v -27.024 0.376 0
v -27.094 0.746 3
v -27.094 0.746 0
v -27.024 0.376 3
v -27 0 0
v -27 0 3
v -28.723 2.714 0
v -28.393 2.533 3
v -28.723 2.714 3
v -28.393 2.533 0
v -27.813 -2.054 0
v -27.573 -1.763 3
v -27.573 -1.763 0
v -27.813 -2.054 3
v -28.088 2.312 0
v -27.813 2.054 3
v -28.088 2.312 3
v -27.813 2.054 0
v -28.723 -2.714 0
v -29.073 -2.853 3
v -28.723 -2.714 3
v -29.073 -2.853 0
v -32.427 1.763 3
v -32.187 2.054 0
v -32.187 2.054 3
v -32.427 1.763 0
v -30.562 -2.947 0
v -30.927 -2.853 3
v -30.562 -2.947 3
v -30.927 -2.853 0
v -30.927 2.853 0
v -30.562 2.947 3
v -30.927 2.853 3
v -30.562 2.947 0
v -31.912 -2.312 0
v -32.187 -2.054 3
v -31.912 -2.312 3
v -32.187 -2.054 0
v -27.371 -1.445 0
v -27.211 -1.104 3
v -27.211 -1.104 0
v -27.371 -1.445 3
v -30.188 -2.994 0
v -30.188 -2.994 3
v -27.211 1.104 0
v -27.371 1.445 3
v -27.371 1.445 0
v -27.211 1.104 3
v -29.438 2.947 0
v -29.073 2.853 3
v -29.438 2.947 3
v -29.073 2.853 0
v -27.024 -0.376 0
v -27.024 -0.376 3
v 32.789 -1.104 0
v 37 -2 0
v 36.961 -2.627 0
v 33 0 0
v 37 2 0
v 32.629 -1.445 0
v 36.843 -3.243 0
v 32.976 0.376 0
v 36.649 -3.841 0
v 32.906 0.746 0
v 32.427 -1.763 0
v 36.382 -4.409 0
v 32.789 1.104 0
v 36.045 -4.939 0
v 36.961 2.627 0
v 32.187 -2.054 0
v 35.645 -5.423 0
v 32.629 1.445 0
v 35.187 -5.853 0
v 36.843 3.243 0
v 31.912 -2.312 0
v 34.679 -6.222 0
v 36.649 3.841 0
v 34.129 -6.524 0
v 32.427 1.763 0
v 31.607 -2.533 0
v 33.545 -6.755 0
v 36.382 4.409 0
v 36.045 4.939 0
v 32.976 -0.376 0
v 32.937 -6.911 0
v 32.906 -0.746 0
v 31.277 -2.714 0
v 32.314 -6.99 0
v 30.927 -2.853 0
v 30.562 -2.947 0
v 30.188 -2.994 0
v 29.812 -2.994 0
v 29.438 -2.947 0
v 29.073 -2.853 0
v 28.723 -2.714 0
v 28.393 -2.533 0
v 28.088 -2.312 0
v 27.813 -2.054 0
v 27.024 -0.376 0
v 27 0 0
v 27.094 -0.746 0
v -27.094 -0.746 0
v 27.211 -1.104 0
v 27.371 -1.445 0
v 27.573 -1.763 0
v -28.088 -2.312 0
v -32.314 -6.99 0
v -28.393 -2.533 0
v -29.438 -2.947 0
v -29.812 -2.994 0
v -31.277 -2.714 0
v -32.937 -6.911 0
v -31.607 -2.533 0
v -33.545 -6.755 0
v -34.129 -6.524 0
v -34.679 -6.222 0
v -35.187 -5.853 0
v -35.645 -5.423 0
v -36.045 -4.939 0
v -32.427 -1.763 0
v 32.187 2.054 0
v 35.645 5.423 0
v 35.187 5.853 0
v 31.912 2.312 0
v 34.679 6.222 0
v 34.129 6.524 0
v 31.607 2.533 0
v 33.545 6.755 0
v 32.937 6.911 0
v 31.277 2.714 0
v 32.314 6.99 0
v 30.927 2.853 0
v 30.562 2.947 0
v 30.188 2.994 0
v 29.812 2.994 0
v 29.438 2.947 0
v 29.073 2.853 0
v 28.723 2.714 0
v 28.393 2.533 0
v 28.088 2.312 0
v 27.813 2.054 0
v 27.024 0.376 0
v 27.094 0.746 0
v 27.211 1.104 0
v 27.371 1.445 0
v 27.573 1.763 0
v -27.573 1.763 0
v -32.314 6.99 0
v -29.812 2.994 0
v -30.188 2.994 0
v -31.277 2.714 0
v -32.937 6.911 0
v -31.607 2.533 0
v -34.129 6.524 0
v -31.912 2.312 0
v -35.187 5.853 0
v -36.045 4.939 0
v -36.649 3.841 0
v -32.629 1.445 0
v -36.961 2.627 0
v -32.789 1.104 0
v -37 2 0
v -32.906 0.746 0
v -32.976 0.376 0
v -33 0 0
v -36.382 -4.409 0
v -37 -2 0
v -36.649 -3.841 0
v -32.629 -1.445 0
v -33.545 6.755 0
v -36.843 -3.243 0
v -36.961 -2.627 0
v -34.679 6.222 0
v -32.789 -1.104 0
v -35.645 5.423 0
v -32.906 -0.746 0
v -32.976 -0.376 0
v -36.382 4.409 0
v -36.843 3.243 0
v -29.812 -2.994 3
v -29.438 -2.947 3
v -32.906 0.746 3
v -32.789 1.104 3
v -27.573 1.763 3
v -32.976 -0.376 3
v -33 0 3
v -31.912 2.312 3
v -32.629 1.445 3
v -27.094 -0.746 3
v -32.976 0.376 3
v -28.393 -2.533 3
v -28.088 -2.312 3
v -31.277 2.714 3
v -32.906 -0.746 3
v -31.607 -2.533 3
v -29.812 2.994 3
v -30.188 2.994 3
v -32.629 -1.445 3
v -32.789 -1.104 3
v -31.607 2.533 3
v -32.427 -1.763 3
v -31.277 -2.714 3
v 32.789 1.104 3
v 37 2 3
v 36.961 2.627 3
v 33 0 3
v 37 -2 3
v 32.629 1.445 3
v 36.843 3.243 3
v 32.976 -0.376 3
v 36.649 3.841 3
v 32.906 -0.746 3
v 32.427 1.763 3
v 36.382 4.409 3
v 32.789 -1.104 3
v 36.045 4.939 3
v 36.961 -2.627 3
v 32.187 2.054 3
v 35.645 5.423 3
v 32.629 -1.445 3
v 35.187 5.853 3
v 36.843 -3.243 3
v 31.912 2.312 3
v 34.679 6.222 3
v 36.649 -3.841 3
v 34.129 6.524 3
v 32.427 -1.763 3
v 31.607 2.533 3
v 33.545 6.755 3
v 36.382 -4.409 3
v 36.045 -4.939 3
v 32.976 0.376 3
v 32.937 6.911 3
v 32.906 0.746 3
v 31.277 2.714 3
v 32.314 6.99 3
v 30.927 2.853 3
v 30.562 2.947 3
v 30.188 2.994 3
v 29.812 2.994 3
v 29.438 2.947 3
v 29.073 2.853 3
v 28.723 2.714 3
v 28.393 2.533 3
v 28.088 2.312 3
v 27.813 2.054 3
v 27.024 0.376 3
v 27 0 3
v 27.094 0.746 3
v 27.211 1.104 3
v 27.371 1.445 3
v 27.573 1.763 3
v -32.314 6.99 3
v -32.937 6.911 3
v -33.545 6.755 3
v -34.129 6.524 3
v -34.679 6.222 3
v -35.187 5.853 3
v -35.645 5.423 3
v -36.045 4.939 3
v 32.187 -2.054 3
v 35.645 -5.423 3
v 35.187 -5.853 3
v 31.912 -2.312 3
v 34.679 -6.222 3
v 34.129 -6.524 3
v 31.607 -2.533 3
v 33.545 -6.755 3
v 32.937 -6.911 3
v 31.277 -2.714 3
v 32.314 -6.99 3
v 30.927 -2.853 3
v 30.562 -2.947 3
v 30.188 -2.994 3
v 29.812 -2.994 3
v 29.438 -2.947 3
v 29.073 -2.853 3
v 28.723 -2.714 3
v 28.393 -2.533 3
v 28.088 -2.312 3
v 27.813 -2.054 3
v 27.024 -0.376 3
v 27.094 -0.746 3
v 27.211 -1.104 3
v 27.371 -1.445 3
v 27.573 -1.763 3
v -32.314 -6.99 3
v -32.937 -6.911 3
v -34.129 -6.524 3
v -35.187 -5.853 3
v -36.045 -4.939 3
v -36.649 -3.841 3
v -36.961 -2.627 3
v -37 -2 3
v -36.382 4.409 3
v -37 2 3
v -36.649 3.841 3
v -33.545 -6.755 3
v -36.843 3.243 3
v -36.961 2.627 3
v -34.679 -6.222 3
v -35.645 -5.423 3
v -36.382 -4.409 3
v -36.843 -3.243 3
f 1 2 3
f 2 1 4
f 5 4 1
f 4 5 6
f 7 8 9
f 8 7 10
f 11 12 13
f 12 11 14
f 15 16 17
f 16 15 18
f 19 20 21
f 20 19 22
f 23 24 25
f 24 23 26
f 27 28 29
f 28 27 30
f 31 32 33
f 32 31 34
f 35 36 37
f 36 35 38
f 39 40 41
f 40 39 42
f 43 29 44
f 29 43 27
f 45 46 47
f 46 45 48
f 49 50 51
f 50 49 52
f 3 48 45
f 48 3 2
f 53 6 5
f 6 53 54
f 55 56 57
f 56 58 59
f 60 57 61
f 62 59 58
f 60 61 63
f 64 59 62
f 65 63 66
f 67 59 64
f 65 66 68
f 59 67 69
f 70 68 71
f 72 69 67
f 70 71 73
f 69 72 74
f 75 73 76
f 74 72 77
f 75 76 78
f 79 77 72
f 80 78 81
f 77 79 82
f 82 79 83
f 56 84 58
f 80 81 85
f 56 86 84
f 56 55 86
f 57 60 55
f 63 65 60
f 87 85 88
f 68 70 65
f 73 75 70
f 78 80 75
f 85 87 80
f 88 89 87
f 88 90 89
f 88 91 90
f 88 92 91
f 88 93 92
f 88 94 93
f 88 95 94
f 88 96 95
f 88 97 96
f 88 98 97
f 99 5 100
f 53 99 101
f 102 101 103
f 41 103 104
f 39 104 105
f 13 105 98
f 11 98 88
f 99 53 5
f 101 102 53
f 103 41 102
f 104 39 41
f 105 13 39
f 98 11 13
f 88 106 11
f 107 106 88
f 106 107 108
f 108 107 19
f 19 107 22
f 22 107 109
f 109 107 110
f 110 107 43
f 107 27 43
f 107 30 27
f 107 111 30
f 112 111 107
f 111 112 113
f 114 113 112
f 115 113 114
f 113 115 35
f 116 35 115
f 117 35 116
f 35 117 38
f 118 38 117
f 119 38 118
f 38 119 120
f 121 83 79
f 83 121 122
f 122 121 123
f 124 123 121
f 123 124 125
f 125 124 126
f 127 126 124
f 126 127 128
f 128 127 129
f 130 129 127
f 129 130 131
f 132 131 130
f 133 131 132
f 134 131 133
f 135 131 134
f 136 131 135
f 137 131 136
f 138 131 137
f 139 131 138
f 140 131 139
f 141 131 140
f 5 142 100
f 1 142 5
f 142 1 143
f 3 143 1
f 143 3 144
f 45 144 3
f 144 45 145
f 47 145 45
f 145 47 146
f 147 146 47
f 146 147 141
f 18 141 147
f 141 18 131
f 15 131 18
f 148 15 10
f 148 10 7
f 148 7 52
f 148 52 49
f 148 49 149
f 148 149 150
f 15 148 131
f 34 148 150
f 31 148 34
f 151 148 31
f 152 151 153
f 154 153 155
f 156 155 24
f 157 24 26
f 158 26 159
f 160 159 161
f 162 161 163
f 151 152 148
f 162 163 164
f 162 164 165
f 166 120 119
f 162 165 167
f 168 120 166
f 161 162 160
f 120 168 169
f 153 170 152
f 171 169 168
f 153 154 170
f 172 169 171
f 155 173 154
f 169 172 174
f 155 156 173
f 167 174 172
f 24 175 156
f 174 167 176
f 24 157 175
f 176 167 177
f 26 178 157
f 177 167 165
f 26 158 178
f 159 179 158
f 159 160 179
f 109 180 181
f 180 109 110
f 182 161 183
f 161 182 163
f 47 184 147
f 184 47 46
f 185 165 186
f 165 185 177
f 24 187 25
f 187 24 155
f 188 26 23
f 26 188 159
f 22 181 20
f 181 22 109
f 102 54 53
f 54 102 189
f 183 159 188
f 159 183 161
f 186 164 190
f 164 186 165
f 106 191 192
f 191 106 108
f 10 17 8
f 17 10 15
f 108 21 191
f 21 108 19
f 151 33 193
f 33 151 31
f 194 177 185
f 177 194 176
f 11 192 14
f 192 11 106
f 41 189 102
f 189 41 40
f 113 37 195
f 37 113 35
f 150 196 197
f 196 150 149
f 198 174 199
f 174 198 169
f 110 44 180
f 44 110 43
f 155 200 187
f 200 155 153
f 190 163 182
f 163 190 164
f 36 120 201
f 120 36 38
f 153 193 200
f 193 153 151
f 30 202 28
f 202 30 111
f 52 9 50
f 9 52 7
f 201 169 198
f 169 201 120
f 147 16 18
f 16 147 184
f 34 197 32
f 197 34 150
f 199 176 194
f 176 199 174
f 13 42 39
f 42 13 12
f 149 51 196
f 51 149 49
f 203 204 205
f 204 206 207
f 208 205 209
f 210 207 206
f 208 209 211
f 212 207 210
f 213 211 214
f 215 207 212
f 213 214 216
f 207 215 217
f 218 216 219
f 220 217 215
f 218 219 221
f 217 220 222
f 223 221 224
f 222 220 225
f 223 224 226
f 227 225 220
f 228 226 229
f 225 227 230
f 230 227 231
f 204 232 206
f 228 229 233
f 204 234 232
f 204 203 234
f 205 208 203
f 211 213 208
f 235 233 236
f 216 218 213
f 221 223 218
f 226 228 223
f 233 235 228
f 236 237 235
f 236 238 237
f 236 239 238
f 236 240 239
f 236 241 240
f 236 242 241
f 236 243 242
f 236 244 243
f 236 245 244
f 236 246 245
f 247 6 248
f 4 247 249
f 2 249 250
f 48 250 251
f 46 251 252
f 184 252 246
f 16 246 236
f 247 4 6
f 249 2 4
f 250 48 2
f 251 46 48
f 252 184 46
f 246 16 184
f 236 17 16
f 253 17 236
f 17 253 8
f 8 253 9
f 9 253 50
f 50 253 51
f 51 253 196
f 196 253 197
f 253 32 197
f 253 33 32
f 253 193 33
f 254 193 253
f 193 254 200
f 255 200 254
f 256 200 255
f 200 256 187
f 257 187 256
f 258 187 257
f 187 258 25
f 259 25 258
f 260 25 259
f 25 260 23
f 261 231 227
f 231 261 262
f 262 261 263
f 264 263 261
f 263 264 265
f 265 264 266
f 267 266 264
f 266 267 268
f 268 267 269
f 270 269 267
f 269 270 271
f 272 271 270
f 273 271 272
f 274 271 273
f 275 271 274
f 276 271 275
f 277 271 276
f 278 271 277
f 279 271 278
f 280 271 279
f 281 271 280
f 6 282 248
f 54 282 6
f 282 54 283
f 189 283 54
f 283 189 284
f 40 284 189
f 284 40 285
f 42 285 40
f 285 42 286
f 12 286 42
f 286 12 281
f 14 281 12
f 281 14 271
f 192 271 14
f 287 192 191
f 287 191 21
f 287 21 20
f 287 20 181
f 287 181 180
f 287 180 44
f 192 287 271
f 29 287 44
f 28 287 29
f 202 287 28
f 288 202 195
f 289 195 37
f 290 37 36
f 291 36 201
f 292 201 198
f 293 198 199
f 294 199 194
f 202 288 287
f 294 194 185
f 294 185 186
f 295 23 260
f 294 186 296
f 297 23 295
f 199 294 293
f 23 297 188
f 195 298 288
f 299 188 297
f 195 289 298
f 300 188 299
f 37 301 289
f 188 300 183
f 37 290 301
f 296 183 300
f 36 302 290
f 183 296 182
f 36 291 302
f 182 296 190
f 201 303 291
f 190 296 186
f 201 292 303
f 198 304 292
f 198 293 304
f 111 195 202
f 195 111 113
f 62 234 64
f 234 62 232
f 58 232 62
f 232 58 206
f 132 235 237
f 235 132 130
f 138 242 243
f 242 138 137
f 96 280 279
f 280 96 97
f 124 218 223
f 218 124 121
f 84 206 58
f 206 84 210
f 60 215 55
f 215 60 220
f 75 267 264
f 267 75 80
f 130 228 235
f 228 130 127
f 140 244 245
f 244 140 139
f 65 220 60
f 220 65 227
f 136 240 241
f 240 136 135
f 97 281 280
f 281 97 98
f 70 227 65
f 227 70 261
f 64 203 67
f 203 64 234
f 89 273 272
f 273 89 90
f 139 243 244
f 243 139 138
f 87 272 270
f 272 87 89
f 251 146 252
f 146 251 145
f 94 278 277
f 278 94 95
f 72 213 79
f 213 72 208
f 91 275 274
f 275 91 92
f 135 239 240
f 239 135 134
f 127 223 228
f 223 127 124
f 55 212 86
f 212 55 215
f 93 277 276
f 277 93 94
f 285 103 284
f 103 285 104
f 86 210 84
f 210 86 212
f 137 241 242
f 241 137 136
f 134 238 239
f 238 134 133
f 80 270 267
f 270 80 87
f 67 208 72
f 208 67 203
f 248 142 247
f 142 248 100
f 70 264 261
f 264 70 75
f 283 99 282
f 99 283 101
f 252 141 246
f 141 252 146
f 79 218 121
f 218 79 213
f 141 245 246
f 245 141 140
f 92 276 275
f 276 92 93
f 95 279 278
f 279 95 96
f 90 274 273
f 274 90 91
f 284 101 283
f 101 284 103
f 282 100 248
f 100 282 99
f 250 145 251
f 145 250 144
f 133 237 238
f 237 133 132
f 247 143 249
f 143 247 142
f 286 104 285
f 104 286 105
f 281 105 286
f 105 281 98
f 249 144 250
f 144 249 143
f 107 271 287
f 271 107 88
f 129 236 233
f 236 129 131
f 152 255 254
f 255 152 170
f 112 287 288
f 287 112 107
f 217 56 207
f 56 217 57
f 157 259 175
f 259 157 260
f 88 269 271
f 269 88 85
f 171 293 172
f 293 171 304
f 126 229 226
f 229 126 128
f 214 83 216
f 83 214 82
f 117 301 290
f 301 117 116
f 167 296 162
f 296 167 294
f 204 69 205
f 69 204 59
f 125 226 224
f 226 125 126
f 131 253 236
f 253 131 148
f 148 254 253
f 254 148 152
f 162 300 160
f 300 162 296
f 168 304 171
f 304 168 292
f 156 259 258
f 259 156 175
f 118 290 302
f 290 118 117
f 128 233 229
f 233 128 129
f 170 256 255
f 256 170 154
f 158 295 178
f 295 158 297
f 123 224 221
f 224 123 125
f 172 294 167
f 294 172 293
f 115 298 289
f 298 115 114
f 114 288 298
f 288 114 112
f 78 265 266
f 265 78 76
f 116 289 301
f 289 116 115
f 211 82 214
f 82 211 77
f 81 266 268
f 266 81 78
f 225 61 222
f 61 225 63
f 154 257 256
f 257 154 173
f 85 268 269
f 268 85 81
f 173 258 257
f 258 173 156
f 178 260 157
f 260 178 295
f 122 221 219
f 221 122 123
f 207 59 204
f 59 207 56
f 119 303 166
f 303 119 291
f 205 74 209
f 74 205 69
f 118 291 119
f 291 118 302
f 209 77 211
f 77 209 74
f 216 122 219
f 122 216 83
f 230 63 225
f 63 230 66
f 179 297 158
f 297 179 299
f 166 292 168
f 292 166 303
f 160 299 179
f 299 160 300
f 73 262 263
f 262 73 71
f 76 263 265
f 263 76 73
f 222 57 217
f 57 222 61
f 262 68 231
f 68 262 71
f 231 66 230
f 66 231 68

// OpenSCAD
$fn = 50;


difference() {
	union() {
		hull() {
			translate(v = [-32.0000000000, 2.0000000000, 0]) {
				cylinder(h = 3, r = 5);
			}
			translate(v = [32.0000000000, 2.0000000000, 0]) {
				cylinder(h = 3, r = 5);
			}
			translate(v = [-32.0000000000, -2.0000000000, 0]) {
				cylinder(h = 3, r = 5);
			}
			translate(v = [32.0000000000, -2.0000000000, 0]) {
				cylinder(h = 3, r = 5);
			}
		}
	}
	union() {
		translate(v = [-30.0000000000, 0.0000000000, 0]) {
			cylinder(h = 3, r = 3.0000000000);
		}
		translate(v = [30.0000000000, 0.0000000000, 0]) {
			cylinder(h = 3, r = 3.0000000000);
		}
		translate(v = [-30.0000000000, 0.0000000000, 0]) {
			cylinder(h = 3, r = 1.5000000000);
		}
		translate(v = [30.0000000000, 0.0000000000, 0]) {
			cylinder(h = 3, r = 1.5000000000);
		}
		translate(v = [-30.0000000000, 0.0000000000, 0]) {
			cylinder(h = 3, r = 1.5000000000);
		}
		translate(v = [30.0000000000, 0.0000000000, 0]) {
			cylinder(h = 3, r = 1.5000000000);
		}
		translate(v = [-30.0000000000, 0.0000000000, 0]) {
			cylinder(h = 3, r = 1.5000000000);
		}
		translate(v = [30.0000000000, 0.0000000000, 0]) {
			cylinder(h = 3, r = 1.5000000000);
		}
	}
}
